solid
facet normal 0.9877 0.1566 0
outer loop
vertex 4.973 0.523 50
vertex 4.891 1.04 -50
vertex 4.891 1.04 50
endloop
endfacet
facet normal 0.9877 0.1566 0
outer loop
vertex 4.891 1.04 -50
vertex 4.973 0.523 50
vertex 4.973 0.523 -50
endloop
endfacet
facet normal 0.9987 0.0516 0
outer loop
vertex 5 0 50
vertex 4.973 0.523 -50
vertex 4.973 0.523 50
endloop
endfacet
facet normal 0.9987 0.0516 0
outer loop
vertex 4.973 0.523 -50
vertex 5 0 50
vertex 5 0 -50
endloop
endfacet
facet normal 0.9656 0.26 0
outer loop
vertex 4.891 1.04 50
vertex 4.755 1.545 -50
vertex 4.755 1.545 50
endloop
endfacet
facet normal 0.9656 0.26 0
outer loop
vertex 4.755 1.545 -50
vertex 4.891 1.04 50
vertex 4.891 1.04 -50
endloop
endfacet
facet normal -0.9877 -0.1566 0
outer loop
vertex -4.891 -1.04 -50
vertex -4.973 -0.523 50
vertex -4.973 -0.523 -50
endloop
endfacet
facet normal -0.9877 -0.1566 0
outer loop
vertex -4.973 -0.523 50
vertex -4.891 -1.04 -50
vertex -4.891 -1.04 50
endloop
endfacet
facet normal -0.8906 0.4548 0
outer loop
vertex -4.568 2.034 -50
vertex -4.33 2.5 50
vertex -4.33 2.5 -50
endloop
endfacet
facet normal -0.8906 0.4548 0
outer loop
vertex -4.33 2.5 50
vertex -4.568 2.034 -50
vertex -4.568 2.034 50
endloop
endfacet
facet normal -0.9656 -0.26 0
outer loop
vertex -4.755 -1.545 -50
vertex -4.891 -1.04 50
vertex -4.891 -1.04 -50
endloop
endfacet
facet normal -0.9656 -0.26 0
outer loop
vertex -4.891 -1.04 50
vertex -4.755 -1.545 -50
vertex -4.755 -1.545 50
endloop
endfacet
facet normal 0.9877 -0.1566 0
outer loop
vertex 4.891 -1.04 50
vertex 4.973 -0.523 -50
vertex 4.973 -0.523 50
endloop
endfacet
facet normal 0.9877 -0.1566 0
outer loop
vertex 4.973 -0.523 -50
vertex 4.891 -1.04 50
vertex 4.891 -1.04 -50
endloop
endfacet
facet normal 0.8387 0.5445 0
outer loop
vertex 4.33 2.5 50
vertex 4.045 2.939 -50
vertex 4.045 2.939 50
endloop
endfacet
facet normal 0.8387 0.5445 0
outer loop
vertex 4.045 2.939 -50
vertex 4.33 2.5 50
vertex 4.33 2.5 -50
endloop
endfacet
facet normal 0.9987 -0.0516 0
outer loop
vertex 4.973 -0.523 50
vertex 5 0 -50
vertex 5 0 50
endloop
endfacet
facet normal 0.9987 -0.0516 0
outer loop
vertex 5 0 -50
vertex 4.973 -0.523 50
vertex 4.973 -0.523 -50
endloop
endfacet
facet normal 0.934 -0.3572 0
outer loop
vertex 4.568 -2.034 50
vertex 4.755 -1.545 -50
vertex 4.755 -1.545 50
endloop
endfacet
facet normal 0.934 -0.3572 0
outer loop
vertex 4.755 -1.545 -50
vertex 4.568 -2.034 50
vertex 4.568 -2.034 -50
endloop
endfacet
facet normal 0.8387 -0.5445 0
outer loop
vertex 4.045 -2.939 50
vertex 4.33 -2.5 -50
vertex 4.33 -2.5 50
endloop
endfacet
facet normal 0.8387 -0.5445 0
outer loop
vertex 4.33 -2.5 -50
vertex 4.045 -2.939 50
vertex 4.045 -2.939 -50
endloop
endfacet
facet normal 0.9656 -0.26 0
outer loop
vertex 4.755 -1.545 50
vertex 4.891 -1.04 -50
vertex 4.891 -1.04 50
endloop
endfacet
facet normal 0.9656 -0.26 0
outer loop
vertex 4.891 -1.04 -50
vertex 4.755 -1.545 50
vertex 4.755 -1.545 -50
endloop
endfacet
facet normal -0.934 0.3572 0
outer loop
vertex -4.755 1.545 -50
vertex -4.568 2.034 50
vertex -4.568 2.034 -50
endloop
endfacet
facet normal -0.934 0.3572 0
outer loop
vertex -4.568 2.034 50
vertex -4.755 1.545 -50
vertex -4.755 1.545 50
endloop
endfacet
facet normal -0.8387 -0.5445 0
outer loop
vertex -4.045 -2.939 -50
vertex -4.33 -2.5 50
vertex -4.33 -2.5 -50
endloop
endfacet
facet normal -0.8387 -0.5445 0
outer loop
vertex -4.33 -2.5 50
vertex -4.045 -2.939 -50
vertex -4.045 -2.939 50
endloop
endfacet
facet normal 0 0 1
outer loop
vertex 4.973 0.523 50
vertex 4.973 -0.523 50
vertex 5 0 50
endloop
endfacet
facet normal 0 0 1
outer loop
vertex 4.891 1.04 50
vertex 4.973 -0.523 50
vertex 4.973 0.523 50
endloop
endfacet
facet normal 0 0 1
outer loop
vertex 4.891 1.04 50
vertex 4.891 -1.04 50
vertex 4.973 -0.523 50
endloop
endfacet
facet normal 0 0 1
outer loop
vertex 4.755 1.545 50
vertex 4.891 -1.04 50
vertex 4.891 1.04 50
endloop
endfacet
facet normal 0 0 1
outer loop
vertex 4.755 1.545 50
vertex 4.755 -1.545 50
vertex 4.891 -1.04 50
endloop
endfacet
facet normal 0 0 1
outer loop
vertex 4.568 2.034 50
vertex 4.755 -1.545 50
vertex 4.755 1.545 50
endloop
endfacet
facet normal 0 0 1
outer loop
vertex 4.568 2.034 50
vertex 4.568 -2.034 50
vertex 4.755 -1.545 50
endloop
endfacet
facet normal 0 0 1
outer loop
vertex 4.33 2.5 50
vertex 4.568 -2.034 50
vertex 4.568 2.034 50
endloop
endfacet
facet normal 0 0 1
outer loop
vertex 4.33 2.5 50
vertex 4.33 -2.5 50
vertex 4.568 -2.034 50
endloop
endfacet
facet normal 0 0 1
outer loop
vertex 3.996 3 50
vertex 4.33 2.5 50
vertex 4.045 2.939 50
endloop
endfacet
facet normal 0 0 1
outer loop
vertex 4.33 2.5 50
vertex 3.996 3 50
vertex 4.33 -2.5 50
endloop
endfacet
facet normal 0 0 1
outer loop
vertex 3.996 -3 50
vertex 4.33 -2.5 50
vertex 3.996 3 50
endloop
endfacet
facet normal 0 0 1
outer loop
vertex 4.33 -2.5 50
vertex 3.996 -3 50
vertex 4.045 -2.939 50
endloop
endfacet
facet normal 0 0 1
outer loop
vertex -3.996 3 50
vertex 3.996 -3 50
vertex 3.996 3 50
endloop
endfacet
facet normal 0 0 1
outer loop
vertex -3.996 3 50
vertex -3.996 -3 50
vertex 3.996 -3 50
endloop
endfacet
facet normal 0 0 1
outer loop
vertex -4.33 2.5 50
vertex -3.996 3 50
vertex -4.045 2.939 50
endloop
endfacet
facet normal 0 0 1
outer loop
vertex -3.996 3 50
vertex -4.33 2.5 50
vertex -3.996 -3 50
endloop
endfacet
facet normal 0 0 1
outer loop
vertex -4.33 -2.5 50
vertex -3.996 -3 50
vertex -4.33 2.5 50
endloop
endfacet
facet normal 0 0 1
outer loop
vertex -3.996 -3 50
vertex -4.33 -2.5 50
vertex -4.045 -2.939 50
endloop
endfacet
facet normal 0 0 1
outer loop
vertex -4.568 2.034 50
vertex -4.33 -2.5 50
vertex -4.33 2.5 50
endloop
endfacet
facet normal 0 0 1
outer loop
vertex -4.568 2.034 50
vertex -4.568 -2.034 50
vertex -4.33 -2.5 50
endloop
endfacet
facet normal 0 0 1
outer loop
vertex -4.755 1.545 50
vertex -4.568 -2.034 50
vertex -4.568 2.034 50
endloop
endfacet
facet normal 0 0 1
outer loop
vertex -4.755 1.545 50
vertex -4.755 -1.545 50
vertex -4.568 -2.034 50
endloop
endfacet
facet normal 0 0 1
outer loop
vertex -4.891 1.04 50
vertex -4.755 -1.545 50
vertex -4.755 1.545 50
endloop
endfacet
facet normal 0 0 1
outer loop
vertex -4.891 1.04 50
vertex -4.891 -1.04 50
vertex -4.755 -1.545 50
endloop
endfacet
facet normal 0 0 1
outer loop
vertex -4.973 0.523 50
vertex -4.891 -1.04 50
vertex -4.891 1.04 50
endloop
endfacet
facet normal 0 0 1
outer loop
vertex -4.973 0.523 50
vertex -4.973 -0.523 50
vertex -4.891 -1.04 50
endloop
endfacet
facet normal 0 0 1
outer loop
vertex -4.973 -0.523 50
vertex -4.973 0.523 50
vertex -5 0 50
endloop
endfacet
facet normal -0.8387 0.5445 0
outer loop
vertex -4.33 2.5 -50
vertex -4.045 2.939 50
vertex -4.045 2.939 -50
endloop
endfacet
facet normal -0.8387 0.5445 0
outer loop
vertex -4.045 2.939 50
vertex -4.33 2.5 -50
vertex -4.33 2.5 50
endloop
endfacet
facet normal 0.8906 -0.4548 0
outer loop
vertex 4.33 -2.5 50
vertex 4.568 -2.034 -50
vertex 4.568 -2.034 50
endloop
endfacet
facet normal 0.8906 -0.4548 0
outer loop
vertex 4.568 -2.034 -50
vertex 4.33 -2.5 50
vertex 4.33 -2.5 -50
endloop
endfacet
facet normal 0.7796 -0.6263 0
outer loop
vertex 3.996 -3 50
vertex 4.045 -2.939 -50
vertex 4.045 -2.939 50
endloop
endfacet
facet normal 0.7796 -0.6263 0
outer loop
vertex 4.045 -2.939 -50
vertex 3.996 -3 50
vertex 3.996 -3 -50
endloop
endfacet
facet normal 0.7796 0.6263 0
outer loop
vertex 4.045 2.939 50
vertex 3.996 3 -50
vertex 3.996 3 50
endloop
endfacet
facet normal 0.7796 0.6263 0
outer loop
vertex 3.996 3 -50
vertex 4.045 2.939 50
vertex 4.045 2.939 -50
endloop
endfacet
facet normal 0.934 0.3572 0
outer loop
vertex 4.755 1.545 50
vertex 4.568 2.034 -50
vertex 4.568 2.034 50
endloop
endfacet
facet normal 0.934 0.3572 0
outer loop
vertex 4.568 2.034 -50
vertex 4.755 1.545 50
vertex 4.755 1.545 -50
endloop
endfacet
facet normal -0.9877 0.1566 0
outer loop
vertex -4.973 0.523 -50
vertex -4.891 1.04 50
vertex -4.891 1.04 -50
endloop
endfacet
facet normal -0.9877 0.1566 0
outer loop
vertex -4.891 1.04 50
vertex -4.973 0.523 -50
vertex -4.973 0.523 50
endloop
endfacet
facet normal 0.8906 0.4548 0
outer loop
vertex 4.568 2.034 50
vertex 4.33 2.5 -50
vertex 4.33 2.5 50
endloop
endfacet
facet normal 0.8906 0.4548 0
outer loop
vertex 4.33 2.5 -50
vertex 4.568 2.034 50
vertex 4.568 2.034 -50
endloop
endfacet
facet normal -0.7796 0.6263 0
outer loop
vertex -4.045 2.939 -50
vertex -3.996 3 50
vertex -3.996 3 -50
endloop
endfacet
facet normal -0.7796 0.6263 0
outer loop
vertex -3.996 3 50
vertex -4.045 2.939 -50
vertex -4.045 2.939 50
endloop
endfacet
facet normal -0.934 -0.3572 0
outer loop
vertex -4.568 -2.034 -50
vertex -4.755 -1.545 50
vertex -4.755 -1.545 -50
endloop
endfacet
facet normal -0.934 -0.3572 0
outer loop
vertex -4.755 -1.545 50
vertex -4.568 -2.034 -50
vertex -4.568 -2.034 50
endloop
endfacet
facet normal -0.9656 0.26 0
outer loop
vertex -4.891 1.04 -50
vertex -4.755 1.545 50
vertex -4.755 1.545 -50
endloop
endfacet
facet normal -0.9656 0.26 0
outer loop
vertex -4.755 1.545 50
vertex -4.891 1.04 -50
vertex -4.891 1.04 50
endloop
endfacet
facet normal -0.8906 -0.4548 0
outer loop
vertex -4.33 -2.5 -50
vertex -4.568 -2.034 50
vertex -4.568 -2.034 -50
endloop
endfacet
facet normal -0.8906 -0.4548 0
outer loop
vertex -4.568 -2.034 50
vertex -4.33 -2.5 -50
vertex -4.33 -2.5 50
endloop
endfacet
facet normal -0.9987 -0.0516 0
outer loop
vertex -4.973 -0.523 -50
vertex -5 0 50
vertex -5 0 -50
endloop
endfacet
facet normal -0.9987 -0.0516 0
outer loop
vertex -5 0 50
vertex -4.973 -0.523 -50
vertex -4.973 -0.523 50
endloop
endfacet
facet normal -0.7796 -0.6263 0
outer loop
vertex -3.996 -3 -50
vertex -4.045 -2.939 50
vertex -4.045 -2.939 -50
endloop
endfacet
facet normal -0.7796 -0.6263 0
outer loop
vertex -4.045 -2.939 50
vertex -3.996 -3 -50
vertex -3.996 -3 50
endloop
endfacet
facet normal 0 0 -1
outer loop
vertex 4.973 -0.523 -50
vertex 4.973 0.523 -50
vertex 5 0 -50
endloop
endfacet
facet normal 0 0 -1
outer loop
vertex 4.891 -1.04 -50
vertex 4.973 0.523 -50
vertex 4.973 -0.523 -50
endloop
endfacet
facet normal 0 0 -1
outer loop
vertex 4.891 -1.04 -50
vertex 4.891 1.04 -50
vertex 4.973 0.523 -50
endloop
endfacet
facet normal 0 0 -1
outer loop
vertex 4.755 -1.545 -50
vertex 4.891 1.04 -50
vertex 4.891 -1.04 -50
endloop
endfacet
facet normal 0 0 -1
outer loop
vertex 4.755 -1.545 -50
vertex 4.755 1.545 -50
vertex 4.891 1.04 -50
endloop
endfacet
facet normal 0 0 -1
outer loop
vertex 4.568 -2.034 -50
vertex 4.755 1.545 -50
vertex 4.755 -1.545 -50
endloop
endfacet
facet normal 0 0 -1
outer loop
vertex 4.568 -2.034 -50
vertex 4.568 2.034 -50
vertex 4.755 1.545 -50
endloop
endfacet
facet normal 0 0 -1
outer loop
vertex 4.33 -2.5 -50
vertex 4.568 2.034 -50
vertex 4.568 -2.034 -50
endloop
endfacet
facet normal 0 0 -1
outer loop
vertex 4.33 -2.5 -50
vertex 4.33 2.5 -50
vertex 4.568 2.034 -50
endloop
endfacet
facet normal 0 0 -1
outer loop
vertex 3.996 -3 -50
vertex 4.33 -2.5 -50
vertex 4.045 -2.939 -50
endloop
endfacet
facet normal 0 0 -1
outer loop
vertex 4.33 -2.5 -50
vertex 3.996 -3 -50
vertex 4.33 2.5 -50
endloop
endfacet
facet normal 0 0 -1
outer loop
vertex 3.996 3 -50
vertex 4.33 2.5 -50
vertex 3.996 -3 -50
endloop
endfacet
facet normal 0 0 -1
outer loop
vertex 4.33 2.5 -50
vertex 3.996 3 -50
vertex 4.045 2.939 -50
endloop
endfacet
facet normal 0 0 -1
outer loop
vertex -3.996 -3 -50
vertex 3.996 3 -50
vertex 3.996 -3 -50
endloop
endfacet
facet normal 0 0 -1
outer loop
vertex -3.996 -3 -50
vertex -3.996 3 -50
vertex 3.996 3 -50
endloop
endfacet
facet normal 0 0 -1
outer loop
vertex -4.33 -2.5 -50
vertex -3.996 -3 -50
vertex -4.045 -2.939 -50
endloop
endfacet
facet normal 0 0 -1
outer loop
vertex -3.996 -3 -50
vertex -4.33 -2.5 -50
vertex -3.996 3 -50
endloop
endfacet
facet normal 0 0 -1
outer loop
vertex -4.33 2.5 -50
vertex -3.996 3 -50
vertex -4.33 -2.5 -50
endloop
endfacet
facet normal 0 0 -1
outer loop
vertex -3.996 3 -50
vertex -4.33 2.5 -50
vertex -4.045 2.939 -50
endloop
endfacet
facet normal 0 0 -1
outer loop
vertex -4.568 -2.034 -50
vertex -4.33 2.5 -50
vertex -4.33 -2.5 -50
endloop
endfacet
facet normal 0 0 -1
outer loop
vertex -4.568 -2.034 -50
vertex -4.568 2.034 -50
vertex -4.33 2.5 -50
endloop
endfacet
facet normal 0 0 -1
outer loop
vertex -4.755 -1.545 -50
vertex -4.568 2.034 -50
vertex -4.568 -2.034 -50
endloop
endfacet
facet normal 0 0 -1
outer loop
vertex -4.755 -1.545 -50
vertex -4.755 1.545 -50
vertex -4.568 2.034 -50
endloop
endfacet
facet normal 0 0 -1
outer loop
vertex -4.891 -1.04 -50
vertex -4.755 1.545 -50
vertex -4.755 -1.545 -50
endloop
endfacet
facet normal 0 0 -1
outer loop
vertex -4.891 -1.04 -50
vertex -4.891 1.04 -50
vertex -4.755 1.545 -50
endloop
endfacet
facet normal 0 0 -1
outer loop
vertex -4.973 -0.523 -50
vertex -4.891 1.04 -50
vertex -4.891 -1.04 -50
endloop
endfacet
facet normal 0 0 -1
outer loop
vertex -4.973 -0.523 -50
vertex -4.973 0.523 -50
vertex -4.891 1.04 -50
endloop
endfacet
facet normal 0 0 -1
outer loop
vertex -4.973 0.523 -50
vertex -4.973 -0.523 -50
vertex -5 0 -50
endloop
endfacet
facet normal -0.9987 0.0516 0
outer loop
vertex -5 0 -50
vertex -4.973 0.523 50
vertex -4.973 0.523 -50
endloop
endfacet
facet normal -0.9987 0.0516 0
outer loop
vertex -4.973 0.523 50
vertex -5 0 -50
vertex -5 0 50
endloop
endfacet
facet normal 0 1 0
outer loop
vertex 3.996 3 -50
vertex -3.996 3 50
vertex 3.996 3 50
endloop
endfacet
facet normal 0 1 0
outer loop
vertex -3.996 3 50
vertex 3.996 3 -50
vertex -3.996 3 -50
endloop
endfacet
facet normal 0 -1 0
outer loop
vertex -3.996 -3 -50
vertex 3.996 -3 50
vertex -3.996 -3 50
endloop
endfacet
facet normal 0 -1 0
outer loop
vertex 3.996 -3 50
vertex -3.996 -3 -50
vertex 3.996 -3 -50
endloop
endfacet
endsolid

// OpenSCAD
// =========================================================
// OpenSCAD Code: 100mm 圓柱體切割成半圓柱 (Half Cylinder)
// =========================================================

// 設定曲面平滑度 (數值越大越平滑)
$fn = 60;

// --- 尺寸變數 ---
cylinder_length = 100; // 圓柱體長度
outer_radius = 5;      // 圓柱體半徑

// --- 主體與切割體 ---
difference() {

    // 1. 主要圓柱體 (Main Cylinder)
    // 圓柱體長度為100，半徑為5。
    // center=true 使圓柱體中心位於 [0, 0, 0]，沿著 Z 軸延伸。
    cylinder(
        h = cylinder_length,
        r = outer_radius,
        center = true
    );


    // 2. 切割用的立方體 (The Cutter/Box)
    // 我們需要一個足夠大的立方體來切掉圓柱體的「上半部」（Y > 3 的部分）。

    // 定義立方體尺寸：
    // X軸：略大於直徑 (10 + 2 = 12)
    // Y軸：略大於半徑 (5 + 1 = 6)
    // Z軸：等於圓柱體長度 (100)

    // 將立方體移動到正確的切割位置：
    // 為了讓立方體的底部邊緣精確對齊圓柱體的中心軸 (Z軸)，
    // 我們將其中心點從 [0, 0, 0] 移動到 [X_offset, Y_offset, Z_offset]。
    translate(v = [-outer_radius - 1, 3, -cylinder_length/2])
    {
        // 立方體從 Y=0 開始向正 Y 方向延伸，完美覆蓋圓柱體的上半部。
        cube(
            size = [outer_radius * 2 + 2, outer_radius + 1, cylinder_length]
        );
    }


    // 3. 切割用的立方體 (The Cutter/Box)
    // 我們需要一個足夠大的立方體來切掉圓柱體的「上半部」（Y <-3 的部分）。

    // 定義立方體尺寸：
    // X軸：略大於直徑 (10 + 2 = 12)
    // Y軸：略大於半徑 (5 + 1 = 6)
    // Z軸：等於圓柱體長度 (100)

    // 將立方體移動到正確的切割位置：
    // 為了讓立方體的底部邊緣精確對齊圓柱體的中心軸 (Z軸)，
    // 我們將其中心點從 [0, 0, 0] 移動到 [X_offset, Y_offset, Z_offset]。
    translate(v = [-outer_radius - 1, -(outer_radius + 1)-3, -cylinder_length/2])
    {
        // 立方體從 Y=0 開始向正 Y 方向延伸，完美覆蓋圓柱體的上半部。
        cube(
            size = [outer_radius * 2 + 2, outer_radius + 1, cylinder_length]
        );
    }

}
